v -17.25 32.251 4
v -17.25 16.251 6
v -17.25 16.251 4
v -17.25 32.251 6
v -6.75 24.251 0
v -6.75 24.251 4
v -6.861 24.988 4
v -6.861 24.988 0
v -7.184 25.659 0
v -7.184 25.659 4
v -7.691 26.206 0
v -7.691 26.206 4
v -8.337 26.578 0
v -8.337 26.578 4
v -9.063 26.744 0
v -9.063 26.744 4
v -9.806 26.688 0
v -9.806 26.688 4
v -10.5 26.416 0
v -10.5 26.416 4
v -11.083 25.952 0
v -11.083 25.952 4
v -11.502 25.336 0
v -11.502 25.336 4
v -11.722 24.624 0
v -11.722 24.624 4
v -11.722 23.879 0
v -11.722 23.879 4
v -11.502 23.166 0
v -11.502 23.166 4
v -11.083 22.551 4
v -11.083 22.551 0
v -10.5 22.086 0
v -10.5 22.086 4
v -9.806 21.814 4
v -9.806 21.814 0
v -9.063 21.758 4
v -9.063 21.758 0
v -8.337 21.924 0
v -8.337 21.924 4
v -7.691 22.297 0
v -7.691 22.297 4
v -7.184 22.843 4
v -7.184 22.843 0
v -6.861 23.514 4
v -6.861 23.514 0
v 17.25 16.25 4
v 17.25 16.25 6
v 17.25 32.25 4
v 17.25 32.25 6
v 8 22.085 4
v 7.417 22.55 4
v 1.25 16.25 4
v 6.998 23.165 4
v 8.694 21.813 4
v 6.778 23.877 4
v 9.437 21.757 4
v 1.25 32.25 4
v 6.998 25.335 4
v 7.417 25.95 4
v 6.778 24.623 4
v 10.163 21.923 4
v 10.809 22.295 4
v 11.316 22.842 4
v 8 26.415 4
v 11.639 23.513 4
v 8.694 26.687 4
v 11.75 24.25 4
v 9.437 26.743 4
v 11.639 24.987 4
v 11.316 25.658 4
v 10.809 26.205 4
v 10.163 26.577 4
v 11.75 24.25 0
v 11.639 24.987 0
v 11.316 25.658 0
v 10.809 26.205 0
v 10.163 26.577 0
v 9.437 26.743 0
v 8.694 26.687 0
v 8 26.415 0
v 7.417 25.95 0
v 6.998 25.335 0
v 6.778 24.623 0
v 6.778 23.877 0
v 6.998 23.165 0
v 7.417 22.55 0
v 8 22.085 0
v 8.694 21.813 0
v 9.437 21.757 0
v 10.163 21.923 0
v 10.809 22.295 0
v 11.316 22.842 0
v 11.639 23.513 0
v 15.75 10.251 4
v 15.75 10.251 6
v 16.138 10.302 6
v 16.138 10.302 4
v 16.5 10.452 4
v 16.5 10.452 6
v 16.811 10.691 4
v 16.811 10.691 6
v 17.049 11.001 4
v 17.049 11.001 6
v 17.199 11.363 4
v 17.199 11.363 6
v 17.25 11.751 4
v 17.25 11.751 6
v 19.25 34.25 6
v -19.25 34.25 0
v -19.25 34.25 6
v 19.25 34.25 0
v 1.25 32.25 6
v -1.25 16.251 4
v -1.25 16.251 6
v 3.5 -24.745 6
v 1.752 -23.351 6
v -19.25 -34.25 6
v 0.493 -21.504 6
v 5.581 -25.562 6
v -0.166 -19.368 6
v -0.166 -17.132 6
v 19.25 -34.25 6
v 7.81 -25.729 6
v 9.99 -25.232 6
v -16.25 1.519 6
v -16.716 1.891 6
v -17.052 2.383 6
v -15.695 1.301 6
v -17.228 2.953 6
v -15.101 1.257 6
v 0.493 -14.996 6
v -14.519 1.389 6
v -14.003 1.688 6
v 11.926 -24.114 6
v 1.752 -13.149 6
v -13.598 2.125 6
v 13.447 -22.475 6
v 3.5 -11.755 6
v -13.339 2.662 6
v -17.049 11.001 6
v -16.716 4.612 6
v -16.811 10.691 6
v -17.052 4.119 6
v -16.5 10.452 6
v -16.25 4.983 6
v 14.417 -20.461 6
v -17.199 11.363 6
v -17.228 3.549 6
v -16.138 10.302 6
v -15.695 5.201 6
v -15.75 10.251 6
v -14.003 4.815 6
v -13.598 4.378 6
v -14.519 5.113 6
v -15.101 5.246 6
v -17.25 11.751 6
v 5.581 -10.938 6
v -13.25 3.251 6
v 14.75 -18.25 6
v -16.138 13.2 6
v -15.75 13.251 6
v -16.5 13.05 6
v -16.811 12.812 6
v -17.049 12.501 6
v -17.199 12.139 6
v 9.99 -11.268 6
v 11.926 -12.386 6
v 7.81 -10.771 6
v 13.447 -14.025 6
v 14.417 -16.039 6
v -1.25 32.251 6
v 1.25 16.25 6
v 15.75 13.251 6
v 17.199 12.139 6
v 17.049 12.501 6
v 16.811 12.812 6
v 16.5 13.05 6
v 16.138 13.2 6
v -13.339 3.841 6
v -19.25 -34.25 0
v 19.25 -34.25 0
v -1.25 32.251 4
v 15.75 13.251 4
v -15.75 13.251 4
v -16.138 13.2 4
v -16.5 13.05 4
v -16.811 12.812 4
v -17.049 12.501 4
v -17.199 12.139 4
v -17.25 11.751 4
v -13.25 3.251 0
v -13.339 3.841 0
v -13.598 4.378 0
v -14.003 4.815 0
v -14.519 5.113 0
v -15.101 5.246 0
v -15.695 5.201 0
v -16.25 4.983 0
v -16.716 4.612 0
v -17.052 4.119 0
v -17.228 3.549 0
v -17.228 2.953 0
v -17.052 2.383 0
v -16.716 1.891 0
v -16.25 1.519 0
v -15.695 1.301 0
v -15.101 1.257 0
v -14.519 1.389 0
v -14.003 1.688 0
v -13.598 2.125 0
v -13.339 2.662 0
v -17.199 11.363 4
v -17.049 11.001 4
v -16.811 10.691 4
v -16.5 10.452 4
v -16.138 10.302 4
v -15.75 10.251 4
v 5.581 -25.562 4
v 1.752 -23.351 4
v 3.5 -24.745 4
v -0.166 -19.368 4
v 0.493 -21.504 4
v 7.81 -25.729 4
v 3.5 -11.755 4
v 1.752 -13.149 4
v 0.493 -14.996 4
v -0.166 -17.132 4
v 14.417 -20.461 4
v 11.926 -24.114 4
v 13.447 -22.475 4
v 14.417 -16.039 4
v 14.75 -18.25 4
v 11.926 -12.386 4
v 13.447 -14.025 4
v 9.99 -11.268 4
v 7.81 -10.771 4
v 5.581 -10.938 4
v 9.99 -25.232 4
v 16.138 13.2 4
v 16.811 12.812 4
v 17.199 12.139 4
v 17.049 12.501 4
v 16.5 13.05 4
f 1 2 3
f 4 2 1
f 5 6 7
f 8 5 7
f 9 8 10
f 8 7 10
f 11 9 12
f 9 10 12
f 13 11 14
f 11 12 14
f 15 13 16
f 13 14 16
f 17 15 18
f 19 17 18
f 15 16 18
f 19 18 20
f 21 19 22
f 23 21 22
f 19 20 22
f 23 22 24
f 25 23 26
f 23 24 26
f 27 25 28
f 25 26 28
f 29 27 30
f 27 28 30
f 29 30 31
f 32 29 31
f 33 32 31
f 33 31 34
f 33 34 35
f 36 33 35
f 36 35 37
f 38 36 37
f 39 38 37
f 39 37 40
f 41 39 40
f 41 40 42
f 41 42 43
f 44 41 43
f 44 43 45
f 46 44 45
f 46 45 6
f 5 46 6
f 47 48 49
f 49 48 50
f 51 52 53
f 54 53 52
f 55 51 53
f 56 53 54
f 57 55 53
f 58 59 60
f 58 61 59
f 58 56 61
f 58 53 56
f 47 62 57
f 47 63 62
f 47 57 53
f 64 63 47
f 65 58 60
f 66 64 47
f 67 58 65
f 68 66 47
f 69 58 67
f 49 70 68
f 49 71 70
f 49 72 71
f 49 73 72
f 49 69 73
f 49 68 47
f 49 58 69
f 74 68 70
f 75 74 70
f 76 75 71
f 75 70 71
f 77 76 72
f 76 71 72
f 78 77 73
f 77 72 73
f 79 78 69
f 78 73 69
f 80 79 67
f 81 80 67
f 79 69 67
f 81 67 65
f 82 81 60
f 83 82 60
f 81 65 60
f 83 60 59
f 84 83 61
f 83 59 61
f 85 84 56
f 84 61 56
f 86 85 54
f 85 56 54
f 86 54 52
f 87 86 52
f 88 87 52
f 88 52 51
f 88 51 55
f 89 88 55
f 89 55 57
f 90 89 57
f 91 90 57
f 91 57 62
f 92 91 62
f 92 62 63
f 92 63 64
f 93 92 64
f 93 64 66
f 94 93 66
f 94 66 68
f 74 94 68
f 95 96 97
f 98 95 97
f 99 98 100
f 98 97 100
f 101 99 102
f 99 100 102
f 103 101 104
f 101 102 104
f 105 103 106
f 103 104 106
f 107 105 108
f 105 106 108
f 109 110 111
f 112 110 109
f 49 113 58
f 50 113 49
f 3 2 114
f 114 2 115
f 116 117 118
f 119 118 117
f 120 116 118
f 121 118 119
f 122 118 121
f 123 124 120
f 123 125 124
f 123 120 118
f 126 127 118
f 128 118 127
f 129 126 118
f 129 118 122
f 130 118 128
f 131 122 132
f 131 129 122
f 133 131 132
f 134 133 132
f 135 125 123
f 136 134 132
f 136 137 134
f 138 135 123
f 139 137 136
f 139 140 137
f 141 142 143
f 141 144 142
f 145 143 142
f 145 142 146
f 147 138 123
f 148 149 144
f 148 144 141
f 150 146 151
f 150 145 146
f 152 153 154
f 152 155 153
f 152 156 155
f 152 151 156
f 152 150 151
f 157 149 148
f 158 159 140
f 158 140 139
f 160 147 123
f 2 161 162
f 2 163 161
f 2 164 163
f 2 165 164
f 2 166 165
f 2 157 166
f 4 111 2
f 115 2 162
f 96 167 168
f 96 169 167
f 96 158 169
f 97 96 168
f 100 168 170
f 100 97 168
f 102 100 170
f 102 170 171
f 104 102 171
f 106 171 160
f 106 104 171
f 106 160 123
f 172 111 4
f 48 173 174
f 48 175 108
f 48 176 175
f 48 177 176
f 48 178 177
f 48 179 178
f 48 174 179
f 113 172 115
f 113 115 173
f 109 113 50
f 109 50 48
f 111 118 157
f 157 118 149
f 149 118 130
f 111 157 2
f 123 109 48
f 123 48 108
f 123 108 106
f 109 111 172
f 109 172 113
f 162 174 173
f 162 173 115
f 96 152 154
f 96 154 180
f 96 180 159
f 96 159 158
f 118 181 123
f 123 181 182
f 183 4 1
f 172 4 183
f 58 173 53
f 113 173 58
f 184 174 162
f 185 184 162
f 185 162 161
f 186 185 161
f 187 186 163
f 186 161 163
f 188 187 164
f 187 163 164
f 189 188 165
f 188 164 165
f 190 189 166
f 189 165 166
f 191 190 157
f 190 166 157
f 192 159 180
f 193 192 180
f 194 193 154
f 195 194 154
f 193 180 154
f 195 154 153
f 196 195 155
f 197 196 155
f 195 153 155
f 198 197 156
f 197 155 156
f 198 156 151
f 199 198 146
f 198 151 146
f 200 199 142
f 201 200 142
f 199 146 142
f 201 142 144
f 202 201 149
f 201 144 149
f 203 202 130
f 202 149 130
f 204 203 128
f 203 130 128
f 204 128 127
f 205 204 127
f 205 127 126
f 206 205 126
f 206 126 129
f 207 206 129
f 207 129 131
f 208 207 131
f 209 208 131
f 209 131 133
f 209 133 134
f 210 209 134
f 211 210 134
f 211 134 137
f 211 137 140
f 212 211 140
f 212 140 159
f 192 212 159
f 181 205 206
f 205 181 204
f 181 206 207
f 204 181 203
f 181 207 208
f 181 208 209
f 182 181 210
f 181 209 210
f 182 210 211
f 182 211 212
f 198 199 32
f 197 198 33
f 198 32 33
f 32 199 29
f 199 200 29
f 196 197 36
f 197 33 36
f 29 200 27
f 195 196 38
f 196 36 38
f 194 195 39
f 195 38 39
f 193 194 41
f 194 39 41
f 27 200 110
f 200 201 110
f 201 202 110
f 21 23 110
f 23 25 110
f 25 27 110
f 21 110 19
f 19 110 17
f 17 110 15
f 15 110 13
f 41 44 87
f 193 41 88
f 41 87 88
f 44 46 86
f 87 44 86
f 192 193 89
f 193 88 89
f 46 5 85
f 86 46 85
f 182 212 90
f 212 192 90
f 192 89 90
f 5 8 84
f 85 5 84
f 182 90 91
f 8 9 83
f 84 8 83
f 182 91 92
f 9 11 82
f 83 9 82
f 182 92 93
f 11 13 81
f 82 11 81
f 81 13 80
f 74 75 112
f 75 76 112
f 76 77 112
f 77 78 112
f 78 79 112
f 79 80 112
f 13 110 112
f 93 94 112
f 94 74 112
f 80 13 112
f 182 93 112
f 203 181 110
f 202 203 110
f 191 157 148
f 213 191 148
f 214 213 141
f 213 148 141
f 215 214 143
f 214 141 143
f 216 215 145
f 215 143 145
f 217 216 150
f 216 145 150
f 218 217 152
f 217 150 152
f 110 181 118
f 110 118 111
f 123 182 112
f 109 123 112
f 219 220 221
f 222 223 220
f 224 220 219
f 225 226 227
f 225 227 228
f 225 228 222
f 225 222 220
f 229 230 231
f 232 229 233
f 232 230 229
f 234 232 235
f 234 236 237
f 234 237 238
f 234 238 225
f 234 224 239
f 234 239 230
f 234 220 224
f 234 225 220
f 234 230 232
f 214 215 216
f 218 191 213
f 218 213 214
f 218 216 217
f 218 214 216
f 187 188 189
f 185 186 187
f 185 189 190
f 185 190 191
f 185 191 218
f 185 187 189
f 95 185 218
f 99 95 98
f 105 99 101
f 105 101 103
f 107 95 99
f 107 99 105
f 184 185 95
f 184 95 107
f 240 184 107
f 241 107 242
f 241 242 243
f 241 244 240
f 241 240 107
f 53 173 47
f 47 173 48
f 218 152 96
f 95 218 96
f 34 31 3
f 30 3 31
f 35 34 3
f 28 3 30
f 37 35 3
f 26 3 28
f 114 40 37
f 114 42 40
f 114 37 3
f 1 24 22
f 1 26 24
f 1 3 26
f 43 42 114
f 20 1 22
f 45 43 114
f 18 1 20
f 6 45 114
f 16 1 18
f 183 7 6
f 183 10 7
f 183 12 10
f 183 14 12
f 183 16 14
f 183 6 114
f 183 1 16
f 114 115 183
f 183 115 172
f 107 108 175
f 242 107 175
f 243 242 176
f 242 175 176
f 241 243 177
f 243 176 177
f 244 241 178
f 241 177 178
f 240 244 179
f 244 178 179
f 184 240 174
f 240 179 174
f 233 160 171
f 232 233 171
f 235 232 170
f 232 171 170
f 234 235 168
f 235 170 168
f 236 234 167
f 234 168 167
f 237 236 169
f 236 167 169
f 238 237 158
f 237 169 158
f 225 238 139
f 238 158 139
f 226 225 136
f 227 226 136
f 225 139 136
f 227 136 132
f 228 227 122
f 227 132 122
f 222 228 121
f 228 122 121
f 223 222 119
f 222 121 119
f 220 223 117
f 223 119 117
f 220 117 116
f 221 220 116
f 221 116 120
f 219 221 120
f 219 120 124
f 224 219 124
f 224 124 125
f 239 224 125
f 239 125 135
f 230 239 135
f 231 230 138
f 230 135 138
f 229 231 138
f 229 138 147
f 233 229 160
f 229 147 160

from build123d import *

# Parameters (mm, degrees)
F0_W      = 38.5
F0_H      = 68.5
F1_DEPTH  = 6
F2_W      = 16
F2_H      = 16
F3_DEPTH  = 2
F5_DEPTH  = 2
F6_R      = 7.5
F7_DEPTH  = 2
F8_R      = 2
F9_DEPTH  = 8
F10_R     = 2.5
F11_DEPTH = 25
F12_R     = 2.5
F13_DEPTH = 25


with BuildPart() as f1:
    # F0 (on Top) → F1 (new body)
    with BuildSketch(Plane.XY):
        Rectangle(F0_W, F0_H)
    extrude(amount=F1_DEPTH)

    # F2 (on face) → F3 (cut)
    with BuildSketch(Plane.XY.offset(6)):
        with Locations((-9.25, 24.2511786477)):
            Rectangle(F2_W, F2_H)
        with Locations((9.25, 24.25)):
            Rectangle(F2_W, F2_H)
    extrude(amount=-F3_DEPTH, mode=Mode.SUBTRACT)

    # F4 (on face) → F5 (cut)
    with BuildSketch(Plane.XY.offset(6)):
        with BuildLine():
            Line((15.7500000197, 13.2511786477), (-15.75, 13.2511786477))
            ThreePointArc((-15.75, 13.2511786477), (-14.6893398282, 12.8118388195), (-14.25, 11.7511786477))
            ThreePointArc((-14.25, 11.7511786477), (-14.6893398282, 10.6905184759), (-15.75, 10.2511786477))
            Line((-15.75, 10.2511786477), (15.7500000167, 10.2511786477))
            ThreePointArc((15.7500000167, 10.2511786477), (14.25, 11.7511786492), (15.7500000197, 13.2511786477))
        make_face()
        with BuildLine():
            ThreePointArc((-14.25, 11.7511786477), (-14.6893398282, 12.8118388195), (-15.75, 13.2511786477))
            ThreePointArc((-15.75, 13.2511786477), (-16.8106601718, 12.8118388195), (-17.25, 11.7511786477))
            ThreePointArc((-17.25, 11.7511786477), (-16.8106601718, 10.6905184759), (-15.75, 10.2511786477))
            ThreePointArc((-15.75, 10.2511786477), (-14.6893398282, 10.6905184759), (-14.25, 11.7511786477))
        make_face()
        with BuildLine():
            ThreePointArc((17.25, 11.7511786477), (16.8106601788, 12.8118388125), (15.7500000197, 13.2511786477))
            ThreePointArc((15.7500000197, 13.2511786477), (14.25, 11.7511786492), (15.7500000167, 10.2511786477))
            ThreePointArc((15.7500000167, 10.2511786477), (16.8106601777, 10.6905184818), (17.25, 11.7511786477))
        make_face()
    extrude(amount=-F5_DEPTH, mode=Mode.SUBTRACT)

    # F6 (on face) → F7 (cut)
    with BuildSketch(Plane.XY.offset(6)):
        with Locations((7.25, -18.25)):
            Circle(F6_R)
    extrude(amount=-F7_DEPTH, mode=Mode.SUBTRACT)

    # F8 (on face) → F9 (cut)
    with BuildSketch(Plane.XY.offset(6)):
        with Locations((-15.25, 3.2511786477)):
            Circle(F8_R)
    extrude(amount=-F9_DEPTH, mode=Mode.SUBTRACT)

    # F10 (on face) → F11 (cut)
    with BuildSketch(Plane.XY.offset(4)):
        with Locations((-9.25, 24.2511786477)):
            Circle(F10_R)
    extrude(amount=-F11_DEPTH, mode=Mode.SUBTRACT)

    # F12 (on face) → F13 (cut)
    with BuildSketch(Plane.XY.offset(4)):
        with Locations((9.25, 24.25)):
            Circle(F12_R)
    extrude(amount=-F13_DEPTH, mode=Mode.SUBTRACT)


solid = f1.part
